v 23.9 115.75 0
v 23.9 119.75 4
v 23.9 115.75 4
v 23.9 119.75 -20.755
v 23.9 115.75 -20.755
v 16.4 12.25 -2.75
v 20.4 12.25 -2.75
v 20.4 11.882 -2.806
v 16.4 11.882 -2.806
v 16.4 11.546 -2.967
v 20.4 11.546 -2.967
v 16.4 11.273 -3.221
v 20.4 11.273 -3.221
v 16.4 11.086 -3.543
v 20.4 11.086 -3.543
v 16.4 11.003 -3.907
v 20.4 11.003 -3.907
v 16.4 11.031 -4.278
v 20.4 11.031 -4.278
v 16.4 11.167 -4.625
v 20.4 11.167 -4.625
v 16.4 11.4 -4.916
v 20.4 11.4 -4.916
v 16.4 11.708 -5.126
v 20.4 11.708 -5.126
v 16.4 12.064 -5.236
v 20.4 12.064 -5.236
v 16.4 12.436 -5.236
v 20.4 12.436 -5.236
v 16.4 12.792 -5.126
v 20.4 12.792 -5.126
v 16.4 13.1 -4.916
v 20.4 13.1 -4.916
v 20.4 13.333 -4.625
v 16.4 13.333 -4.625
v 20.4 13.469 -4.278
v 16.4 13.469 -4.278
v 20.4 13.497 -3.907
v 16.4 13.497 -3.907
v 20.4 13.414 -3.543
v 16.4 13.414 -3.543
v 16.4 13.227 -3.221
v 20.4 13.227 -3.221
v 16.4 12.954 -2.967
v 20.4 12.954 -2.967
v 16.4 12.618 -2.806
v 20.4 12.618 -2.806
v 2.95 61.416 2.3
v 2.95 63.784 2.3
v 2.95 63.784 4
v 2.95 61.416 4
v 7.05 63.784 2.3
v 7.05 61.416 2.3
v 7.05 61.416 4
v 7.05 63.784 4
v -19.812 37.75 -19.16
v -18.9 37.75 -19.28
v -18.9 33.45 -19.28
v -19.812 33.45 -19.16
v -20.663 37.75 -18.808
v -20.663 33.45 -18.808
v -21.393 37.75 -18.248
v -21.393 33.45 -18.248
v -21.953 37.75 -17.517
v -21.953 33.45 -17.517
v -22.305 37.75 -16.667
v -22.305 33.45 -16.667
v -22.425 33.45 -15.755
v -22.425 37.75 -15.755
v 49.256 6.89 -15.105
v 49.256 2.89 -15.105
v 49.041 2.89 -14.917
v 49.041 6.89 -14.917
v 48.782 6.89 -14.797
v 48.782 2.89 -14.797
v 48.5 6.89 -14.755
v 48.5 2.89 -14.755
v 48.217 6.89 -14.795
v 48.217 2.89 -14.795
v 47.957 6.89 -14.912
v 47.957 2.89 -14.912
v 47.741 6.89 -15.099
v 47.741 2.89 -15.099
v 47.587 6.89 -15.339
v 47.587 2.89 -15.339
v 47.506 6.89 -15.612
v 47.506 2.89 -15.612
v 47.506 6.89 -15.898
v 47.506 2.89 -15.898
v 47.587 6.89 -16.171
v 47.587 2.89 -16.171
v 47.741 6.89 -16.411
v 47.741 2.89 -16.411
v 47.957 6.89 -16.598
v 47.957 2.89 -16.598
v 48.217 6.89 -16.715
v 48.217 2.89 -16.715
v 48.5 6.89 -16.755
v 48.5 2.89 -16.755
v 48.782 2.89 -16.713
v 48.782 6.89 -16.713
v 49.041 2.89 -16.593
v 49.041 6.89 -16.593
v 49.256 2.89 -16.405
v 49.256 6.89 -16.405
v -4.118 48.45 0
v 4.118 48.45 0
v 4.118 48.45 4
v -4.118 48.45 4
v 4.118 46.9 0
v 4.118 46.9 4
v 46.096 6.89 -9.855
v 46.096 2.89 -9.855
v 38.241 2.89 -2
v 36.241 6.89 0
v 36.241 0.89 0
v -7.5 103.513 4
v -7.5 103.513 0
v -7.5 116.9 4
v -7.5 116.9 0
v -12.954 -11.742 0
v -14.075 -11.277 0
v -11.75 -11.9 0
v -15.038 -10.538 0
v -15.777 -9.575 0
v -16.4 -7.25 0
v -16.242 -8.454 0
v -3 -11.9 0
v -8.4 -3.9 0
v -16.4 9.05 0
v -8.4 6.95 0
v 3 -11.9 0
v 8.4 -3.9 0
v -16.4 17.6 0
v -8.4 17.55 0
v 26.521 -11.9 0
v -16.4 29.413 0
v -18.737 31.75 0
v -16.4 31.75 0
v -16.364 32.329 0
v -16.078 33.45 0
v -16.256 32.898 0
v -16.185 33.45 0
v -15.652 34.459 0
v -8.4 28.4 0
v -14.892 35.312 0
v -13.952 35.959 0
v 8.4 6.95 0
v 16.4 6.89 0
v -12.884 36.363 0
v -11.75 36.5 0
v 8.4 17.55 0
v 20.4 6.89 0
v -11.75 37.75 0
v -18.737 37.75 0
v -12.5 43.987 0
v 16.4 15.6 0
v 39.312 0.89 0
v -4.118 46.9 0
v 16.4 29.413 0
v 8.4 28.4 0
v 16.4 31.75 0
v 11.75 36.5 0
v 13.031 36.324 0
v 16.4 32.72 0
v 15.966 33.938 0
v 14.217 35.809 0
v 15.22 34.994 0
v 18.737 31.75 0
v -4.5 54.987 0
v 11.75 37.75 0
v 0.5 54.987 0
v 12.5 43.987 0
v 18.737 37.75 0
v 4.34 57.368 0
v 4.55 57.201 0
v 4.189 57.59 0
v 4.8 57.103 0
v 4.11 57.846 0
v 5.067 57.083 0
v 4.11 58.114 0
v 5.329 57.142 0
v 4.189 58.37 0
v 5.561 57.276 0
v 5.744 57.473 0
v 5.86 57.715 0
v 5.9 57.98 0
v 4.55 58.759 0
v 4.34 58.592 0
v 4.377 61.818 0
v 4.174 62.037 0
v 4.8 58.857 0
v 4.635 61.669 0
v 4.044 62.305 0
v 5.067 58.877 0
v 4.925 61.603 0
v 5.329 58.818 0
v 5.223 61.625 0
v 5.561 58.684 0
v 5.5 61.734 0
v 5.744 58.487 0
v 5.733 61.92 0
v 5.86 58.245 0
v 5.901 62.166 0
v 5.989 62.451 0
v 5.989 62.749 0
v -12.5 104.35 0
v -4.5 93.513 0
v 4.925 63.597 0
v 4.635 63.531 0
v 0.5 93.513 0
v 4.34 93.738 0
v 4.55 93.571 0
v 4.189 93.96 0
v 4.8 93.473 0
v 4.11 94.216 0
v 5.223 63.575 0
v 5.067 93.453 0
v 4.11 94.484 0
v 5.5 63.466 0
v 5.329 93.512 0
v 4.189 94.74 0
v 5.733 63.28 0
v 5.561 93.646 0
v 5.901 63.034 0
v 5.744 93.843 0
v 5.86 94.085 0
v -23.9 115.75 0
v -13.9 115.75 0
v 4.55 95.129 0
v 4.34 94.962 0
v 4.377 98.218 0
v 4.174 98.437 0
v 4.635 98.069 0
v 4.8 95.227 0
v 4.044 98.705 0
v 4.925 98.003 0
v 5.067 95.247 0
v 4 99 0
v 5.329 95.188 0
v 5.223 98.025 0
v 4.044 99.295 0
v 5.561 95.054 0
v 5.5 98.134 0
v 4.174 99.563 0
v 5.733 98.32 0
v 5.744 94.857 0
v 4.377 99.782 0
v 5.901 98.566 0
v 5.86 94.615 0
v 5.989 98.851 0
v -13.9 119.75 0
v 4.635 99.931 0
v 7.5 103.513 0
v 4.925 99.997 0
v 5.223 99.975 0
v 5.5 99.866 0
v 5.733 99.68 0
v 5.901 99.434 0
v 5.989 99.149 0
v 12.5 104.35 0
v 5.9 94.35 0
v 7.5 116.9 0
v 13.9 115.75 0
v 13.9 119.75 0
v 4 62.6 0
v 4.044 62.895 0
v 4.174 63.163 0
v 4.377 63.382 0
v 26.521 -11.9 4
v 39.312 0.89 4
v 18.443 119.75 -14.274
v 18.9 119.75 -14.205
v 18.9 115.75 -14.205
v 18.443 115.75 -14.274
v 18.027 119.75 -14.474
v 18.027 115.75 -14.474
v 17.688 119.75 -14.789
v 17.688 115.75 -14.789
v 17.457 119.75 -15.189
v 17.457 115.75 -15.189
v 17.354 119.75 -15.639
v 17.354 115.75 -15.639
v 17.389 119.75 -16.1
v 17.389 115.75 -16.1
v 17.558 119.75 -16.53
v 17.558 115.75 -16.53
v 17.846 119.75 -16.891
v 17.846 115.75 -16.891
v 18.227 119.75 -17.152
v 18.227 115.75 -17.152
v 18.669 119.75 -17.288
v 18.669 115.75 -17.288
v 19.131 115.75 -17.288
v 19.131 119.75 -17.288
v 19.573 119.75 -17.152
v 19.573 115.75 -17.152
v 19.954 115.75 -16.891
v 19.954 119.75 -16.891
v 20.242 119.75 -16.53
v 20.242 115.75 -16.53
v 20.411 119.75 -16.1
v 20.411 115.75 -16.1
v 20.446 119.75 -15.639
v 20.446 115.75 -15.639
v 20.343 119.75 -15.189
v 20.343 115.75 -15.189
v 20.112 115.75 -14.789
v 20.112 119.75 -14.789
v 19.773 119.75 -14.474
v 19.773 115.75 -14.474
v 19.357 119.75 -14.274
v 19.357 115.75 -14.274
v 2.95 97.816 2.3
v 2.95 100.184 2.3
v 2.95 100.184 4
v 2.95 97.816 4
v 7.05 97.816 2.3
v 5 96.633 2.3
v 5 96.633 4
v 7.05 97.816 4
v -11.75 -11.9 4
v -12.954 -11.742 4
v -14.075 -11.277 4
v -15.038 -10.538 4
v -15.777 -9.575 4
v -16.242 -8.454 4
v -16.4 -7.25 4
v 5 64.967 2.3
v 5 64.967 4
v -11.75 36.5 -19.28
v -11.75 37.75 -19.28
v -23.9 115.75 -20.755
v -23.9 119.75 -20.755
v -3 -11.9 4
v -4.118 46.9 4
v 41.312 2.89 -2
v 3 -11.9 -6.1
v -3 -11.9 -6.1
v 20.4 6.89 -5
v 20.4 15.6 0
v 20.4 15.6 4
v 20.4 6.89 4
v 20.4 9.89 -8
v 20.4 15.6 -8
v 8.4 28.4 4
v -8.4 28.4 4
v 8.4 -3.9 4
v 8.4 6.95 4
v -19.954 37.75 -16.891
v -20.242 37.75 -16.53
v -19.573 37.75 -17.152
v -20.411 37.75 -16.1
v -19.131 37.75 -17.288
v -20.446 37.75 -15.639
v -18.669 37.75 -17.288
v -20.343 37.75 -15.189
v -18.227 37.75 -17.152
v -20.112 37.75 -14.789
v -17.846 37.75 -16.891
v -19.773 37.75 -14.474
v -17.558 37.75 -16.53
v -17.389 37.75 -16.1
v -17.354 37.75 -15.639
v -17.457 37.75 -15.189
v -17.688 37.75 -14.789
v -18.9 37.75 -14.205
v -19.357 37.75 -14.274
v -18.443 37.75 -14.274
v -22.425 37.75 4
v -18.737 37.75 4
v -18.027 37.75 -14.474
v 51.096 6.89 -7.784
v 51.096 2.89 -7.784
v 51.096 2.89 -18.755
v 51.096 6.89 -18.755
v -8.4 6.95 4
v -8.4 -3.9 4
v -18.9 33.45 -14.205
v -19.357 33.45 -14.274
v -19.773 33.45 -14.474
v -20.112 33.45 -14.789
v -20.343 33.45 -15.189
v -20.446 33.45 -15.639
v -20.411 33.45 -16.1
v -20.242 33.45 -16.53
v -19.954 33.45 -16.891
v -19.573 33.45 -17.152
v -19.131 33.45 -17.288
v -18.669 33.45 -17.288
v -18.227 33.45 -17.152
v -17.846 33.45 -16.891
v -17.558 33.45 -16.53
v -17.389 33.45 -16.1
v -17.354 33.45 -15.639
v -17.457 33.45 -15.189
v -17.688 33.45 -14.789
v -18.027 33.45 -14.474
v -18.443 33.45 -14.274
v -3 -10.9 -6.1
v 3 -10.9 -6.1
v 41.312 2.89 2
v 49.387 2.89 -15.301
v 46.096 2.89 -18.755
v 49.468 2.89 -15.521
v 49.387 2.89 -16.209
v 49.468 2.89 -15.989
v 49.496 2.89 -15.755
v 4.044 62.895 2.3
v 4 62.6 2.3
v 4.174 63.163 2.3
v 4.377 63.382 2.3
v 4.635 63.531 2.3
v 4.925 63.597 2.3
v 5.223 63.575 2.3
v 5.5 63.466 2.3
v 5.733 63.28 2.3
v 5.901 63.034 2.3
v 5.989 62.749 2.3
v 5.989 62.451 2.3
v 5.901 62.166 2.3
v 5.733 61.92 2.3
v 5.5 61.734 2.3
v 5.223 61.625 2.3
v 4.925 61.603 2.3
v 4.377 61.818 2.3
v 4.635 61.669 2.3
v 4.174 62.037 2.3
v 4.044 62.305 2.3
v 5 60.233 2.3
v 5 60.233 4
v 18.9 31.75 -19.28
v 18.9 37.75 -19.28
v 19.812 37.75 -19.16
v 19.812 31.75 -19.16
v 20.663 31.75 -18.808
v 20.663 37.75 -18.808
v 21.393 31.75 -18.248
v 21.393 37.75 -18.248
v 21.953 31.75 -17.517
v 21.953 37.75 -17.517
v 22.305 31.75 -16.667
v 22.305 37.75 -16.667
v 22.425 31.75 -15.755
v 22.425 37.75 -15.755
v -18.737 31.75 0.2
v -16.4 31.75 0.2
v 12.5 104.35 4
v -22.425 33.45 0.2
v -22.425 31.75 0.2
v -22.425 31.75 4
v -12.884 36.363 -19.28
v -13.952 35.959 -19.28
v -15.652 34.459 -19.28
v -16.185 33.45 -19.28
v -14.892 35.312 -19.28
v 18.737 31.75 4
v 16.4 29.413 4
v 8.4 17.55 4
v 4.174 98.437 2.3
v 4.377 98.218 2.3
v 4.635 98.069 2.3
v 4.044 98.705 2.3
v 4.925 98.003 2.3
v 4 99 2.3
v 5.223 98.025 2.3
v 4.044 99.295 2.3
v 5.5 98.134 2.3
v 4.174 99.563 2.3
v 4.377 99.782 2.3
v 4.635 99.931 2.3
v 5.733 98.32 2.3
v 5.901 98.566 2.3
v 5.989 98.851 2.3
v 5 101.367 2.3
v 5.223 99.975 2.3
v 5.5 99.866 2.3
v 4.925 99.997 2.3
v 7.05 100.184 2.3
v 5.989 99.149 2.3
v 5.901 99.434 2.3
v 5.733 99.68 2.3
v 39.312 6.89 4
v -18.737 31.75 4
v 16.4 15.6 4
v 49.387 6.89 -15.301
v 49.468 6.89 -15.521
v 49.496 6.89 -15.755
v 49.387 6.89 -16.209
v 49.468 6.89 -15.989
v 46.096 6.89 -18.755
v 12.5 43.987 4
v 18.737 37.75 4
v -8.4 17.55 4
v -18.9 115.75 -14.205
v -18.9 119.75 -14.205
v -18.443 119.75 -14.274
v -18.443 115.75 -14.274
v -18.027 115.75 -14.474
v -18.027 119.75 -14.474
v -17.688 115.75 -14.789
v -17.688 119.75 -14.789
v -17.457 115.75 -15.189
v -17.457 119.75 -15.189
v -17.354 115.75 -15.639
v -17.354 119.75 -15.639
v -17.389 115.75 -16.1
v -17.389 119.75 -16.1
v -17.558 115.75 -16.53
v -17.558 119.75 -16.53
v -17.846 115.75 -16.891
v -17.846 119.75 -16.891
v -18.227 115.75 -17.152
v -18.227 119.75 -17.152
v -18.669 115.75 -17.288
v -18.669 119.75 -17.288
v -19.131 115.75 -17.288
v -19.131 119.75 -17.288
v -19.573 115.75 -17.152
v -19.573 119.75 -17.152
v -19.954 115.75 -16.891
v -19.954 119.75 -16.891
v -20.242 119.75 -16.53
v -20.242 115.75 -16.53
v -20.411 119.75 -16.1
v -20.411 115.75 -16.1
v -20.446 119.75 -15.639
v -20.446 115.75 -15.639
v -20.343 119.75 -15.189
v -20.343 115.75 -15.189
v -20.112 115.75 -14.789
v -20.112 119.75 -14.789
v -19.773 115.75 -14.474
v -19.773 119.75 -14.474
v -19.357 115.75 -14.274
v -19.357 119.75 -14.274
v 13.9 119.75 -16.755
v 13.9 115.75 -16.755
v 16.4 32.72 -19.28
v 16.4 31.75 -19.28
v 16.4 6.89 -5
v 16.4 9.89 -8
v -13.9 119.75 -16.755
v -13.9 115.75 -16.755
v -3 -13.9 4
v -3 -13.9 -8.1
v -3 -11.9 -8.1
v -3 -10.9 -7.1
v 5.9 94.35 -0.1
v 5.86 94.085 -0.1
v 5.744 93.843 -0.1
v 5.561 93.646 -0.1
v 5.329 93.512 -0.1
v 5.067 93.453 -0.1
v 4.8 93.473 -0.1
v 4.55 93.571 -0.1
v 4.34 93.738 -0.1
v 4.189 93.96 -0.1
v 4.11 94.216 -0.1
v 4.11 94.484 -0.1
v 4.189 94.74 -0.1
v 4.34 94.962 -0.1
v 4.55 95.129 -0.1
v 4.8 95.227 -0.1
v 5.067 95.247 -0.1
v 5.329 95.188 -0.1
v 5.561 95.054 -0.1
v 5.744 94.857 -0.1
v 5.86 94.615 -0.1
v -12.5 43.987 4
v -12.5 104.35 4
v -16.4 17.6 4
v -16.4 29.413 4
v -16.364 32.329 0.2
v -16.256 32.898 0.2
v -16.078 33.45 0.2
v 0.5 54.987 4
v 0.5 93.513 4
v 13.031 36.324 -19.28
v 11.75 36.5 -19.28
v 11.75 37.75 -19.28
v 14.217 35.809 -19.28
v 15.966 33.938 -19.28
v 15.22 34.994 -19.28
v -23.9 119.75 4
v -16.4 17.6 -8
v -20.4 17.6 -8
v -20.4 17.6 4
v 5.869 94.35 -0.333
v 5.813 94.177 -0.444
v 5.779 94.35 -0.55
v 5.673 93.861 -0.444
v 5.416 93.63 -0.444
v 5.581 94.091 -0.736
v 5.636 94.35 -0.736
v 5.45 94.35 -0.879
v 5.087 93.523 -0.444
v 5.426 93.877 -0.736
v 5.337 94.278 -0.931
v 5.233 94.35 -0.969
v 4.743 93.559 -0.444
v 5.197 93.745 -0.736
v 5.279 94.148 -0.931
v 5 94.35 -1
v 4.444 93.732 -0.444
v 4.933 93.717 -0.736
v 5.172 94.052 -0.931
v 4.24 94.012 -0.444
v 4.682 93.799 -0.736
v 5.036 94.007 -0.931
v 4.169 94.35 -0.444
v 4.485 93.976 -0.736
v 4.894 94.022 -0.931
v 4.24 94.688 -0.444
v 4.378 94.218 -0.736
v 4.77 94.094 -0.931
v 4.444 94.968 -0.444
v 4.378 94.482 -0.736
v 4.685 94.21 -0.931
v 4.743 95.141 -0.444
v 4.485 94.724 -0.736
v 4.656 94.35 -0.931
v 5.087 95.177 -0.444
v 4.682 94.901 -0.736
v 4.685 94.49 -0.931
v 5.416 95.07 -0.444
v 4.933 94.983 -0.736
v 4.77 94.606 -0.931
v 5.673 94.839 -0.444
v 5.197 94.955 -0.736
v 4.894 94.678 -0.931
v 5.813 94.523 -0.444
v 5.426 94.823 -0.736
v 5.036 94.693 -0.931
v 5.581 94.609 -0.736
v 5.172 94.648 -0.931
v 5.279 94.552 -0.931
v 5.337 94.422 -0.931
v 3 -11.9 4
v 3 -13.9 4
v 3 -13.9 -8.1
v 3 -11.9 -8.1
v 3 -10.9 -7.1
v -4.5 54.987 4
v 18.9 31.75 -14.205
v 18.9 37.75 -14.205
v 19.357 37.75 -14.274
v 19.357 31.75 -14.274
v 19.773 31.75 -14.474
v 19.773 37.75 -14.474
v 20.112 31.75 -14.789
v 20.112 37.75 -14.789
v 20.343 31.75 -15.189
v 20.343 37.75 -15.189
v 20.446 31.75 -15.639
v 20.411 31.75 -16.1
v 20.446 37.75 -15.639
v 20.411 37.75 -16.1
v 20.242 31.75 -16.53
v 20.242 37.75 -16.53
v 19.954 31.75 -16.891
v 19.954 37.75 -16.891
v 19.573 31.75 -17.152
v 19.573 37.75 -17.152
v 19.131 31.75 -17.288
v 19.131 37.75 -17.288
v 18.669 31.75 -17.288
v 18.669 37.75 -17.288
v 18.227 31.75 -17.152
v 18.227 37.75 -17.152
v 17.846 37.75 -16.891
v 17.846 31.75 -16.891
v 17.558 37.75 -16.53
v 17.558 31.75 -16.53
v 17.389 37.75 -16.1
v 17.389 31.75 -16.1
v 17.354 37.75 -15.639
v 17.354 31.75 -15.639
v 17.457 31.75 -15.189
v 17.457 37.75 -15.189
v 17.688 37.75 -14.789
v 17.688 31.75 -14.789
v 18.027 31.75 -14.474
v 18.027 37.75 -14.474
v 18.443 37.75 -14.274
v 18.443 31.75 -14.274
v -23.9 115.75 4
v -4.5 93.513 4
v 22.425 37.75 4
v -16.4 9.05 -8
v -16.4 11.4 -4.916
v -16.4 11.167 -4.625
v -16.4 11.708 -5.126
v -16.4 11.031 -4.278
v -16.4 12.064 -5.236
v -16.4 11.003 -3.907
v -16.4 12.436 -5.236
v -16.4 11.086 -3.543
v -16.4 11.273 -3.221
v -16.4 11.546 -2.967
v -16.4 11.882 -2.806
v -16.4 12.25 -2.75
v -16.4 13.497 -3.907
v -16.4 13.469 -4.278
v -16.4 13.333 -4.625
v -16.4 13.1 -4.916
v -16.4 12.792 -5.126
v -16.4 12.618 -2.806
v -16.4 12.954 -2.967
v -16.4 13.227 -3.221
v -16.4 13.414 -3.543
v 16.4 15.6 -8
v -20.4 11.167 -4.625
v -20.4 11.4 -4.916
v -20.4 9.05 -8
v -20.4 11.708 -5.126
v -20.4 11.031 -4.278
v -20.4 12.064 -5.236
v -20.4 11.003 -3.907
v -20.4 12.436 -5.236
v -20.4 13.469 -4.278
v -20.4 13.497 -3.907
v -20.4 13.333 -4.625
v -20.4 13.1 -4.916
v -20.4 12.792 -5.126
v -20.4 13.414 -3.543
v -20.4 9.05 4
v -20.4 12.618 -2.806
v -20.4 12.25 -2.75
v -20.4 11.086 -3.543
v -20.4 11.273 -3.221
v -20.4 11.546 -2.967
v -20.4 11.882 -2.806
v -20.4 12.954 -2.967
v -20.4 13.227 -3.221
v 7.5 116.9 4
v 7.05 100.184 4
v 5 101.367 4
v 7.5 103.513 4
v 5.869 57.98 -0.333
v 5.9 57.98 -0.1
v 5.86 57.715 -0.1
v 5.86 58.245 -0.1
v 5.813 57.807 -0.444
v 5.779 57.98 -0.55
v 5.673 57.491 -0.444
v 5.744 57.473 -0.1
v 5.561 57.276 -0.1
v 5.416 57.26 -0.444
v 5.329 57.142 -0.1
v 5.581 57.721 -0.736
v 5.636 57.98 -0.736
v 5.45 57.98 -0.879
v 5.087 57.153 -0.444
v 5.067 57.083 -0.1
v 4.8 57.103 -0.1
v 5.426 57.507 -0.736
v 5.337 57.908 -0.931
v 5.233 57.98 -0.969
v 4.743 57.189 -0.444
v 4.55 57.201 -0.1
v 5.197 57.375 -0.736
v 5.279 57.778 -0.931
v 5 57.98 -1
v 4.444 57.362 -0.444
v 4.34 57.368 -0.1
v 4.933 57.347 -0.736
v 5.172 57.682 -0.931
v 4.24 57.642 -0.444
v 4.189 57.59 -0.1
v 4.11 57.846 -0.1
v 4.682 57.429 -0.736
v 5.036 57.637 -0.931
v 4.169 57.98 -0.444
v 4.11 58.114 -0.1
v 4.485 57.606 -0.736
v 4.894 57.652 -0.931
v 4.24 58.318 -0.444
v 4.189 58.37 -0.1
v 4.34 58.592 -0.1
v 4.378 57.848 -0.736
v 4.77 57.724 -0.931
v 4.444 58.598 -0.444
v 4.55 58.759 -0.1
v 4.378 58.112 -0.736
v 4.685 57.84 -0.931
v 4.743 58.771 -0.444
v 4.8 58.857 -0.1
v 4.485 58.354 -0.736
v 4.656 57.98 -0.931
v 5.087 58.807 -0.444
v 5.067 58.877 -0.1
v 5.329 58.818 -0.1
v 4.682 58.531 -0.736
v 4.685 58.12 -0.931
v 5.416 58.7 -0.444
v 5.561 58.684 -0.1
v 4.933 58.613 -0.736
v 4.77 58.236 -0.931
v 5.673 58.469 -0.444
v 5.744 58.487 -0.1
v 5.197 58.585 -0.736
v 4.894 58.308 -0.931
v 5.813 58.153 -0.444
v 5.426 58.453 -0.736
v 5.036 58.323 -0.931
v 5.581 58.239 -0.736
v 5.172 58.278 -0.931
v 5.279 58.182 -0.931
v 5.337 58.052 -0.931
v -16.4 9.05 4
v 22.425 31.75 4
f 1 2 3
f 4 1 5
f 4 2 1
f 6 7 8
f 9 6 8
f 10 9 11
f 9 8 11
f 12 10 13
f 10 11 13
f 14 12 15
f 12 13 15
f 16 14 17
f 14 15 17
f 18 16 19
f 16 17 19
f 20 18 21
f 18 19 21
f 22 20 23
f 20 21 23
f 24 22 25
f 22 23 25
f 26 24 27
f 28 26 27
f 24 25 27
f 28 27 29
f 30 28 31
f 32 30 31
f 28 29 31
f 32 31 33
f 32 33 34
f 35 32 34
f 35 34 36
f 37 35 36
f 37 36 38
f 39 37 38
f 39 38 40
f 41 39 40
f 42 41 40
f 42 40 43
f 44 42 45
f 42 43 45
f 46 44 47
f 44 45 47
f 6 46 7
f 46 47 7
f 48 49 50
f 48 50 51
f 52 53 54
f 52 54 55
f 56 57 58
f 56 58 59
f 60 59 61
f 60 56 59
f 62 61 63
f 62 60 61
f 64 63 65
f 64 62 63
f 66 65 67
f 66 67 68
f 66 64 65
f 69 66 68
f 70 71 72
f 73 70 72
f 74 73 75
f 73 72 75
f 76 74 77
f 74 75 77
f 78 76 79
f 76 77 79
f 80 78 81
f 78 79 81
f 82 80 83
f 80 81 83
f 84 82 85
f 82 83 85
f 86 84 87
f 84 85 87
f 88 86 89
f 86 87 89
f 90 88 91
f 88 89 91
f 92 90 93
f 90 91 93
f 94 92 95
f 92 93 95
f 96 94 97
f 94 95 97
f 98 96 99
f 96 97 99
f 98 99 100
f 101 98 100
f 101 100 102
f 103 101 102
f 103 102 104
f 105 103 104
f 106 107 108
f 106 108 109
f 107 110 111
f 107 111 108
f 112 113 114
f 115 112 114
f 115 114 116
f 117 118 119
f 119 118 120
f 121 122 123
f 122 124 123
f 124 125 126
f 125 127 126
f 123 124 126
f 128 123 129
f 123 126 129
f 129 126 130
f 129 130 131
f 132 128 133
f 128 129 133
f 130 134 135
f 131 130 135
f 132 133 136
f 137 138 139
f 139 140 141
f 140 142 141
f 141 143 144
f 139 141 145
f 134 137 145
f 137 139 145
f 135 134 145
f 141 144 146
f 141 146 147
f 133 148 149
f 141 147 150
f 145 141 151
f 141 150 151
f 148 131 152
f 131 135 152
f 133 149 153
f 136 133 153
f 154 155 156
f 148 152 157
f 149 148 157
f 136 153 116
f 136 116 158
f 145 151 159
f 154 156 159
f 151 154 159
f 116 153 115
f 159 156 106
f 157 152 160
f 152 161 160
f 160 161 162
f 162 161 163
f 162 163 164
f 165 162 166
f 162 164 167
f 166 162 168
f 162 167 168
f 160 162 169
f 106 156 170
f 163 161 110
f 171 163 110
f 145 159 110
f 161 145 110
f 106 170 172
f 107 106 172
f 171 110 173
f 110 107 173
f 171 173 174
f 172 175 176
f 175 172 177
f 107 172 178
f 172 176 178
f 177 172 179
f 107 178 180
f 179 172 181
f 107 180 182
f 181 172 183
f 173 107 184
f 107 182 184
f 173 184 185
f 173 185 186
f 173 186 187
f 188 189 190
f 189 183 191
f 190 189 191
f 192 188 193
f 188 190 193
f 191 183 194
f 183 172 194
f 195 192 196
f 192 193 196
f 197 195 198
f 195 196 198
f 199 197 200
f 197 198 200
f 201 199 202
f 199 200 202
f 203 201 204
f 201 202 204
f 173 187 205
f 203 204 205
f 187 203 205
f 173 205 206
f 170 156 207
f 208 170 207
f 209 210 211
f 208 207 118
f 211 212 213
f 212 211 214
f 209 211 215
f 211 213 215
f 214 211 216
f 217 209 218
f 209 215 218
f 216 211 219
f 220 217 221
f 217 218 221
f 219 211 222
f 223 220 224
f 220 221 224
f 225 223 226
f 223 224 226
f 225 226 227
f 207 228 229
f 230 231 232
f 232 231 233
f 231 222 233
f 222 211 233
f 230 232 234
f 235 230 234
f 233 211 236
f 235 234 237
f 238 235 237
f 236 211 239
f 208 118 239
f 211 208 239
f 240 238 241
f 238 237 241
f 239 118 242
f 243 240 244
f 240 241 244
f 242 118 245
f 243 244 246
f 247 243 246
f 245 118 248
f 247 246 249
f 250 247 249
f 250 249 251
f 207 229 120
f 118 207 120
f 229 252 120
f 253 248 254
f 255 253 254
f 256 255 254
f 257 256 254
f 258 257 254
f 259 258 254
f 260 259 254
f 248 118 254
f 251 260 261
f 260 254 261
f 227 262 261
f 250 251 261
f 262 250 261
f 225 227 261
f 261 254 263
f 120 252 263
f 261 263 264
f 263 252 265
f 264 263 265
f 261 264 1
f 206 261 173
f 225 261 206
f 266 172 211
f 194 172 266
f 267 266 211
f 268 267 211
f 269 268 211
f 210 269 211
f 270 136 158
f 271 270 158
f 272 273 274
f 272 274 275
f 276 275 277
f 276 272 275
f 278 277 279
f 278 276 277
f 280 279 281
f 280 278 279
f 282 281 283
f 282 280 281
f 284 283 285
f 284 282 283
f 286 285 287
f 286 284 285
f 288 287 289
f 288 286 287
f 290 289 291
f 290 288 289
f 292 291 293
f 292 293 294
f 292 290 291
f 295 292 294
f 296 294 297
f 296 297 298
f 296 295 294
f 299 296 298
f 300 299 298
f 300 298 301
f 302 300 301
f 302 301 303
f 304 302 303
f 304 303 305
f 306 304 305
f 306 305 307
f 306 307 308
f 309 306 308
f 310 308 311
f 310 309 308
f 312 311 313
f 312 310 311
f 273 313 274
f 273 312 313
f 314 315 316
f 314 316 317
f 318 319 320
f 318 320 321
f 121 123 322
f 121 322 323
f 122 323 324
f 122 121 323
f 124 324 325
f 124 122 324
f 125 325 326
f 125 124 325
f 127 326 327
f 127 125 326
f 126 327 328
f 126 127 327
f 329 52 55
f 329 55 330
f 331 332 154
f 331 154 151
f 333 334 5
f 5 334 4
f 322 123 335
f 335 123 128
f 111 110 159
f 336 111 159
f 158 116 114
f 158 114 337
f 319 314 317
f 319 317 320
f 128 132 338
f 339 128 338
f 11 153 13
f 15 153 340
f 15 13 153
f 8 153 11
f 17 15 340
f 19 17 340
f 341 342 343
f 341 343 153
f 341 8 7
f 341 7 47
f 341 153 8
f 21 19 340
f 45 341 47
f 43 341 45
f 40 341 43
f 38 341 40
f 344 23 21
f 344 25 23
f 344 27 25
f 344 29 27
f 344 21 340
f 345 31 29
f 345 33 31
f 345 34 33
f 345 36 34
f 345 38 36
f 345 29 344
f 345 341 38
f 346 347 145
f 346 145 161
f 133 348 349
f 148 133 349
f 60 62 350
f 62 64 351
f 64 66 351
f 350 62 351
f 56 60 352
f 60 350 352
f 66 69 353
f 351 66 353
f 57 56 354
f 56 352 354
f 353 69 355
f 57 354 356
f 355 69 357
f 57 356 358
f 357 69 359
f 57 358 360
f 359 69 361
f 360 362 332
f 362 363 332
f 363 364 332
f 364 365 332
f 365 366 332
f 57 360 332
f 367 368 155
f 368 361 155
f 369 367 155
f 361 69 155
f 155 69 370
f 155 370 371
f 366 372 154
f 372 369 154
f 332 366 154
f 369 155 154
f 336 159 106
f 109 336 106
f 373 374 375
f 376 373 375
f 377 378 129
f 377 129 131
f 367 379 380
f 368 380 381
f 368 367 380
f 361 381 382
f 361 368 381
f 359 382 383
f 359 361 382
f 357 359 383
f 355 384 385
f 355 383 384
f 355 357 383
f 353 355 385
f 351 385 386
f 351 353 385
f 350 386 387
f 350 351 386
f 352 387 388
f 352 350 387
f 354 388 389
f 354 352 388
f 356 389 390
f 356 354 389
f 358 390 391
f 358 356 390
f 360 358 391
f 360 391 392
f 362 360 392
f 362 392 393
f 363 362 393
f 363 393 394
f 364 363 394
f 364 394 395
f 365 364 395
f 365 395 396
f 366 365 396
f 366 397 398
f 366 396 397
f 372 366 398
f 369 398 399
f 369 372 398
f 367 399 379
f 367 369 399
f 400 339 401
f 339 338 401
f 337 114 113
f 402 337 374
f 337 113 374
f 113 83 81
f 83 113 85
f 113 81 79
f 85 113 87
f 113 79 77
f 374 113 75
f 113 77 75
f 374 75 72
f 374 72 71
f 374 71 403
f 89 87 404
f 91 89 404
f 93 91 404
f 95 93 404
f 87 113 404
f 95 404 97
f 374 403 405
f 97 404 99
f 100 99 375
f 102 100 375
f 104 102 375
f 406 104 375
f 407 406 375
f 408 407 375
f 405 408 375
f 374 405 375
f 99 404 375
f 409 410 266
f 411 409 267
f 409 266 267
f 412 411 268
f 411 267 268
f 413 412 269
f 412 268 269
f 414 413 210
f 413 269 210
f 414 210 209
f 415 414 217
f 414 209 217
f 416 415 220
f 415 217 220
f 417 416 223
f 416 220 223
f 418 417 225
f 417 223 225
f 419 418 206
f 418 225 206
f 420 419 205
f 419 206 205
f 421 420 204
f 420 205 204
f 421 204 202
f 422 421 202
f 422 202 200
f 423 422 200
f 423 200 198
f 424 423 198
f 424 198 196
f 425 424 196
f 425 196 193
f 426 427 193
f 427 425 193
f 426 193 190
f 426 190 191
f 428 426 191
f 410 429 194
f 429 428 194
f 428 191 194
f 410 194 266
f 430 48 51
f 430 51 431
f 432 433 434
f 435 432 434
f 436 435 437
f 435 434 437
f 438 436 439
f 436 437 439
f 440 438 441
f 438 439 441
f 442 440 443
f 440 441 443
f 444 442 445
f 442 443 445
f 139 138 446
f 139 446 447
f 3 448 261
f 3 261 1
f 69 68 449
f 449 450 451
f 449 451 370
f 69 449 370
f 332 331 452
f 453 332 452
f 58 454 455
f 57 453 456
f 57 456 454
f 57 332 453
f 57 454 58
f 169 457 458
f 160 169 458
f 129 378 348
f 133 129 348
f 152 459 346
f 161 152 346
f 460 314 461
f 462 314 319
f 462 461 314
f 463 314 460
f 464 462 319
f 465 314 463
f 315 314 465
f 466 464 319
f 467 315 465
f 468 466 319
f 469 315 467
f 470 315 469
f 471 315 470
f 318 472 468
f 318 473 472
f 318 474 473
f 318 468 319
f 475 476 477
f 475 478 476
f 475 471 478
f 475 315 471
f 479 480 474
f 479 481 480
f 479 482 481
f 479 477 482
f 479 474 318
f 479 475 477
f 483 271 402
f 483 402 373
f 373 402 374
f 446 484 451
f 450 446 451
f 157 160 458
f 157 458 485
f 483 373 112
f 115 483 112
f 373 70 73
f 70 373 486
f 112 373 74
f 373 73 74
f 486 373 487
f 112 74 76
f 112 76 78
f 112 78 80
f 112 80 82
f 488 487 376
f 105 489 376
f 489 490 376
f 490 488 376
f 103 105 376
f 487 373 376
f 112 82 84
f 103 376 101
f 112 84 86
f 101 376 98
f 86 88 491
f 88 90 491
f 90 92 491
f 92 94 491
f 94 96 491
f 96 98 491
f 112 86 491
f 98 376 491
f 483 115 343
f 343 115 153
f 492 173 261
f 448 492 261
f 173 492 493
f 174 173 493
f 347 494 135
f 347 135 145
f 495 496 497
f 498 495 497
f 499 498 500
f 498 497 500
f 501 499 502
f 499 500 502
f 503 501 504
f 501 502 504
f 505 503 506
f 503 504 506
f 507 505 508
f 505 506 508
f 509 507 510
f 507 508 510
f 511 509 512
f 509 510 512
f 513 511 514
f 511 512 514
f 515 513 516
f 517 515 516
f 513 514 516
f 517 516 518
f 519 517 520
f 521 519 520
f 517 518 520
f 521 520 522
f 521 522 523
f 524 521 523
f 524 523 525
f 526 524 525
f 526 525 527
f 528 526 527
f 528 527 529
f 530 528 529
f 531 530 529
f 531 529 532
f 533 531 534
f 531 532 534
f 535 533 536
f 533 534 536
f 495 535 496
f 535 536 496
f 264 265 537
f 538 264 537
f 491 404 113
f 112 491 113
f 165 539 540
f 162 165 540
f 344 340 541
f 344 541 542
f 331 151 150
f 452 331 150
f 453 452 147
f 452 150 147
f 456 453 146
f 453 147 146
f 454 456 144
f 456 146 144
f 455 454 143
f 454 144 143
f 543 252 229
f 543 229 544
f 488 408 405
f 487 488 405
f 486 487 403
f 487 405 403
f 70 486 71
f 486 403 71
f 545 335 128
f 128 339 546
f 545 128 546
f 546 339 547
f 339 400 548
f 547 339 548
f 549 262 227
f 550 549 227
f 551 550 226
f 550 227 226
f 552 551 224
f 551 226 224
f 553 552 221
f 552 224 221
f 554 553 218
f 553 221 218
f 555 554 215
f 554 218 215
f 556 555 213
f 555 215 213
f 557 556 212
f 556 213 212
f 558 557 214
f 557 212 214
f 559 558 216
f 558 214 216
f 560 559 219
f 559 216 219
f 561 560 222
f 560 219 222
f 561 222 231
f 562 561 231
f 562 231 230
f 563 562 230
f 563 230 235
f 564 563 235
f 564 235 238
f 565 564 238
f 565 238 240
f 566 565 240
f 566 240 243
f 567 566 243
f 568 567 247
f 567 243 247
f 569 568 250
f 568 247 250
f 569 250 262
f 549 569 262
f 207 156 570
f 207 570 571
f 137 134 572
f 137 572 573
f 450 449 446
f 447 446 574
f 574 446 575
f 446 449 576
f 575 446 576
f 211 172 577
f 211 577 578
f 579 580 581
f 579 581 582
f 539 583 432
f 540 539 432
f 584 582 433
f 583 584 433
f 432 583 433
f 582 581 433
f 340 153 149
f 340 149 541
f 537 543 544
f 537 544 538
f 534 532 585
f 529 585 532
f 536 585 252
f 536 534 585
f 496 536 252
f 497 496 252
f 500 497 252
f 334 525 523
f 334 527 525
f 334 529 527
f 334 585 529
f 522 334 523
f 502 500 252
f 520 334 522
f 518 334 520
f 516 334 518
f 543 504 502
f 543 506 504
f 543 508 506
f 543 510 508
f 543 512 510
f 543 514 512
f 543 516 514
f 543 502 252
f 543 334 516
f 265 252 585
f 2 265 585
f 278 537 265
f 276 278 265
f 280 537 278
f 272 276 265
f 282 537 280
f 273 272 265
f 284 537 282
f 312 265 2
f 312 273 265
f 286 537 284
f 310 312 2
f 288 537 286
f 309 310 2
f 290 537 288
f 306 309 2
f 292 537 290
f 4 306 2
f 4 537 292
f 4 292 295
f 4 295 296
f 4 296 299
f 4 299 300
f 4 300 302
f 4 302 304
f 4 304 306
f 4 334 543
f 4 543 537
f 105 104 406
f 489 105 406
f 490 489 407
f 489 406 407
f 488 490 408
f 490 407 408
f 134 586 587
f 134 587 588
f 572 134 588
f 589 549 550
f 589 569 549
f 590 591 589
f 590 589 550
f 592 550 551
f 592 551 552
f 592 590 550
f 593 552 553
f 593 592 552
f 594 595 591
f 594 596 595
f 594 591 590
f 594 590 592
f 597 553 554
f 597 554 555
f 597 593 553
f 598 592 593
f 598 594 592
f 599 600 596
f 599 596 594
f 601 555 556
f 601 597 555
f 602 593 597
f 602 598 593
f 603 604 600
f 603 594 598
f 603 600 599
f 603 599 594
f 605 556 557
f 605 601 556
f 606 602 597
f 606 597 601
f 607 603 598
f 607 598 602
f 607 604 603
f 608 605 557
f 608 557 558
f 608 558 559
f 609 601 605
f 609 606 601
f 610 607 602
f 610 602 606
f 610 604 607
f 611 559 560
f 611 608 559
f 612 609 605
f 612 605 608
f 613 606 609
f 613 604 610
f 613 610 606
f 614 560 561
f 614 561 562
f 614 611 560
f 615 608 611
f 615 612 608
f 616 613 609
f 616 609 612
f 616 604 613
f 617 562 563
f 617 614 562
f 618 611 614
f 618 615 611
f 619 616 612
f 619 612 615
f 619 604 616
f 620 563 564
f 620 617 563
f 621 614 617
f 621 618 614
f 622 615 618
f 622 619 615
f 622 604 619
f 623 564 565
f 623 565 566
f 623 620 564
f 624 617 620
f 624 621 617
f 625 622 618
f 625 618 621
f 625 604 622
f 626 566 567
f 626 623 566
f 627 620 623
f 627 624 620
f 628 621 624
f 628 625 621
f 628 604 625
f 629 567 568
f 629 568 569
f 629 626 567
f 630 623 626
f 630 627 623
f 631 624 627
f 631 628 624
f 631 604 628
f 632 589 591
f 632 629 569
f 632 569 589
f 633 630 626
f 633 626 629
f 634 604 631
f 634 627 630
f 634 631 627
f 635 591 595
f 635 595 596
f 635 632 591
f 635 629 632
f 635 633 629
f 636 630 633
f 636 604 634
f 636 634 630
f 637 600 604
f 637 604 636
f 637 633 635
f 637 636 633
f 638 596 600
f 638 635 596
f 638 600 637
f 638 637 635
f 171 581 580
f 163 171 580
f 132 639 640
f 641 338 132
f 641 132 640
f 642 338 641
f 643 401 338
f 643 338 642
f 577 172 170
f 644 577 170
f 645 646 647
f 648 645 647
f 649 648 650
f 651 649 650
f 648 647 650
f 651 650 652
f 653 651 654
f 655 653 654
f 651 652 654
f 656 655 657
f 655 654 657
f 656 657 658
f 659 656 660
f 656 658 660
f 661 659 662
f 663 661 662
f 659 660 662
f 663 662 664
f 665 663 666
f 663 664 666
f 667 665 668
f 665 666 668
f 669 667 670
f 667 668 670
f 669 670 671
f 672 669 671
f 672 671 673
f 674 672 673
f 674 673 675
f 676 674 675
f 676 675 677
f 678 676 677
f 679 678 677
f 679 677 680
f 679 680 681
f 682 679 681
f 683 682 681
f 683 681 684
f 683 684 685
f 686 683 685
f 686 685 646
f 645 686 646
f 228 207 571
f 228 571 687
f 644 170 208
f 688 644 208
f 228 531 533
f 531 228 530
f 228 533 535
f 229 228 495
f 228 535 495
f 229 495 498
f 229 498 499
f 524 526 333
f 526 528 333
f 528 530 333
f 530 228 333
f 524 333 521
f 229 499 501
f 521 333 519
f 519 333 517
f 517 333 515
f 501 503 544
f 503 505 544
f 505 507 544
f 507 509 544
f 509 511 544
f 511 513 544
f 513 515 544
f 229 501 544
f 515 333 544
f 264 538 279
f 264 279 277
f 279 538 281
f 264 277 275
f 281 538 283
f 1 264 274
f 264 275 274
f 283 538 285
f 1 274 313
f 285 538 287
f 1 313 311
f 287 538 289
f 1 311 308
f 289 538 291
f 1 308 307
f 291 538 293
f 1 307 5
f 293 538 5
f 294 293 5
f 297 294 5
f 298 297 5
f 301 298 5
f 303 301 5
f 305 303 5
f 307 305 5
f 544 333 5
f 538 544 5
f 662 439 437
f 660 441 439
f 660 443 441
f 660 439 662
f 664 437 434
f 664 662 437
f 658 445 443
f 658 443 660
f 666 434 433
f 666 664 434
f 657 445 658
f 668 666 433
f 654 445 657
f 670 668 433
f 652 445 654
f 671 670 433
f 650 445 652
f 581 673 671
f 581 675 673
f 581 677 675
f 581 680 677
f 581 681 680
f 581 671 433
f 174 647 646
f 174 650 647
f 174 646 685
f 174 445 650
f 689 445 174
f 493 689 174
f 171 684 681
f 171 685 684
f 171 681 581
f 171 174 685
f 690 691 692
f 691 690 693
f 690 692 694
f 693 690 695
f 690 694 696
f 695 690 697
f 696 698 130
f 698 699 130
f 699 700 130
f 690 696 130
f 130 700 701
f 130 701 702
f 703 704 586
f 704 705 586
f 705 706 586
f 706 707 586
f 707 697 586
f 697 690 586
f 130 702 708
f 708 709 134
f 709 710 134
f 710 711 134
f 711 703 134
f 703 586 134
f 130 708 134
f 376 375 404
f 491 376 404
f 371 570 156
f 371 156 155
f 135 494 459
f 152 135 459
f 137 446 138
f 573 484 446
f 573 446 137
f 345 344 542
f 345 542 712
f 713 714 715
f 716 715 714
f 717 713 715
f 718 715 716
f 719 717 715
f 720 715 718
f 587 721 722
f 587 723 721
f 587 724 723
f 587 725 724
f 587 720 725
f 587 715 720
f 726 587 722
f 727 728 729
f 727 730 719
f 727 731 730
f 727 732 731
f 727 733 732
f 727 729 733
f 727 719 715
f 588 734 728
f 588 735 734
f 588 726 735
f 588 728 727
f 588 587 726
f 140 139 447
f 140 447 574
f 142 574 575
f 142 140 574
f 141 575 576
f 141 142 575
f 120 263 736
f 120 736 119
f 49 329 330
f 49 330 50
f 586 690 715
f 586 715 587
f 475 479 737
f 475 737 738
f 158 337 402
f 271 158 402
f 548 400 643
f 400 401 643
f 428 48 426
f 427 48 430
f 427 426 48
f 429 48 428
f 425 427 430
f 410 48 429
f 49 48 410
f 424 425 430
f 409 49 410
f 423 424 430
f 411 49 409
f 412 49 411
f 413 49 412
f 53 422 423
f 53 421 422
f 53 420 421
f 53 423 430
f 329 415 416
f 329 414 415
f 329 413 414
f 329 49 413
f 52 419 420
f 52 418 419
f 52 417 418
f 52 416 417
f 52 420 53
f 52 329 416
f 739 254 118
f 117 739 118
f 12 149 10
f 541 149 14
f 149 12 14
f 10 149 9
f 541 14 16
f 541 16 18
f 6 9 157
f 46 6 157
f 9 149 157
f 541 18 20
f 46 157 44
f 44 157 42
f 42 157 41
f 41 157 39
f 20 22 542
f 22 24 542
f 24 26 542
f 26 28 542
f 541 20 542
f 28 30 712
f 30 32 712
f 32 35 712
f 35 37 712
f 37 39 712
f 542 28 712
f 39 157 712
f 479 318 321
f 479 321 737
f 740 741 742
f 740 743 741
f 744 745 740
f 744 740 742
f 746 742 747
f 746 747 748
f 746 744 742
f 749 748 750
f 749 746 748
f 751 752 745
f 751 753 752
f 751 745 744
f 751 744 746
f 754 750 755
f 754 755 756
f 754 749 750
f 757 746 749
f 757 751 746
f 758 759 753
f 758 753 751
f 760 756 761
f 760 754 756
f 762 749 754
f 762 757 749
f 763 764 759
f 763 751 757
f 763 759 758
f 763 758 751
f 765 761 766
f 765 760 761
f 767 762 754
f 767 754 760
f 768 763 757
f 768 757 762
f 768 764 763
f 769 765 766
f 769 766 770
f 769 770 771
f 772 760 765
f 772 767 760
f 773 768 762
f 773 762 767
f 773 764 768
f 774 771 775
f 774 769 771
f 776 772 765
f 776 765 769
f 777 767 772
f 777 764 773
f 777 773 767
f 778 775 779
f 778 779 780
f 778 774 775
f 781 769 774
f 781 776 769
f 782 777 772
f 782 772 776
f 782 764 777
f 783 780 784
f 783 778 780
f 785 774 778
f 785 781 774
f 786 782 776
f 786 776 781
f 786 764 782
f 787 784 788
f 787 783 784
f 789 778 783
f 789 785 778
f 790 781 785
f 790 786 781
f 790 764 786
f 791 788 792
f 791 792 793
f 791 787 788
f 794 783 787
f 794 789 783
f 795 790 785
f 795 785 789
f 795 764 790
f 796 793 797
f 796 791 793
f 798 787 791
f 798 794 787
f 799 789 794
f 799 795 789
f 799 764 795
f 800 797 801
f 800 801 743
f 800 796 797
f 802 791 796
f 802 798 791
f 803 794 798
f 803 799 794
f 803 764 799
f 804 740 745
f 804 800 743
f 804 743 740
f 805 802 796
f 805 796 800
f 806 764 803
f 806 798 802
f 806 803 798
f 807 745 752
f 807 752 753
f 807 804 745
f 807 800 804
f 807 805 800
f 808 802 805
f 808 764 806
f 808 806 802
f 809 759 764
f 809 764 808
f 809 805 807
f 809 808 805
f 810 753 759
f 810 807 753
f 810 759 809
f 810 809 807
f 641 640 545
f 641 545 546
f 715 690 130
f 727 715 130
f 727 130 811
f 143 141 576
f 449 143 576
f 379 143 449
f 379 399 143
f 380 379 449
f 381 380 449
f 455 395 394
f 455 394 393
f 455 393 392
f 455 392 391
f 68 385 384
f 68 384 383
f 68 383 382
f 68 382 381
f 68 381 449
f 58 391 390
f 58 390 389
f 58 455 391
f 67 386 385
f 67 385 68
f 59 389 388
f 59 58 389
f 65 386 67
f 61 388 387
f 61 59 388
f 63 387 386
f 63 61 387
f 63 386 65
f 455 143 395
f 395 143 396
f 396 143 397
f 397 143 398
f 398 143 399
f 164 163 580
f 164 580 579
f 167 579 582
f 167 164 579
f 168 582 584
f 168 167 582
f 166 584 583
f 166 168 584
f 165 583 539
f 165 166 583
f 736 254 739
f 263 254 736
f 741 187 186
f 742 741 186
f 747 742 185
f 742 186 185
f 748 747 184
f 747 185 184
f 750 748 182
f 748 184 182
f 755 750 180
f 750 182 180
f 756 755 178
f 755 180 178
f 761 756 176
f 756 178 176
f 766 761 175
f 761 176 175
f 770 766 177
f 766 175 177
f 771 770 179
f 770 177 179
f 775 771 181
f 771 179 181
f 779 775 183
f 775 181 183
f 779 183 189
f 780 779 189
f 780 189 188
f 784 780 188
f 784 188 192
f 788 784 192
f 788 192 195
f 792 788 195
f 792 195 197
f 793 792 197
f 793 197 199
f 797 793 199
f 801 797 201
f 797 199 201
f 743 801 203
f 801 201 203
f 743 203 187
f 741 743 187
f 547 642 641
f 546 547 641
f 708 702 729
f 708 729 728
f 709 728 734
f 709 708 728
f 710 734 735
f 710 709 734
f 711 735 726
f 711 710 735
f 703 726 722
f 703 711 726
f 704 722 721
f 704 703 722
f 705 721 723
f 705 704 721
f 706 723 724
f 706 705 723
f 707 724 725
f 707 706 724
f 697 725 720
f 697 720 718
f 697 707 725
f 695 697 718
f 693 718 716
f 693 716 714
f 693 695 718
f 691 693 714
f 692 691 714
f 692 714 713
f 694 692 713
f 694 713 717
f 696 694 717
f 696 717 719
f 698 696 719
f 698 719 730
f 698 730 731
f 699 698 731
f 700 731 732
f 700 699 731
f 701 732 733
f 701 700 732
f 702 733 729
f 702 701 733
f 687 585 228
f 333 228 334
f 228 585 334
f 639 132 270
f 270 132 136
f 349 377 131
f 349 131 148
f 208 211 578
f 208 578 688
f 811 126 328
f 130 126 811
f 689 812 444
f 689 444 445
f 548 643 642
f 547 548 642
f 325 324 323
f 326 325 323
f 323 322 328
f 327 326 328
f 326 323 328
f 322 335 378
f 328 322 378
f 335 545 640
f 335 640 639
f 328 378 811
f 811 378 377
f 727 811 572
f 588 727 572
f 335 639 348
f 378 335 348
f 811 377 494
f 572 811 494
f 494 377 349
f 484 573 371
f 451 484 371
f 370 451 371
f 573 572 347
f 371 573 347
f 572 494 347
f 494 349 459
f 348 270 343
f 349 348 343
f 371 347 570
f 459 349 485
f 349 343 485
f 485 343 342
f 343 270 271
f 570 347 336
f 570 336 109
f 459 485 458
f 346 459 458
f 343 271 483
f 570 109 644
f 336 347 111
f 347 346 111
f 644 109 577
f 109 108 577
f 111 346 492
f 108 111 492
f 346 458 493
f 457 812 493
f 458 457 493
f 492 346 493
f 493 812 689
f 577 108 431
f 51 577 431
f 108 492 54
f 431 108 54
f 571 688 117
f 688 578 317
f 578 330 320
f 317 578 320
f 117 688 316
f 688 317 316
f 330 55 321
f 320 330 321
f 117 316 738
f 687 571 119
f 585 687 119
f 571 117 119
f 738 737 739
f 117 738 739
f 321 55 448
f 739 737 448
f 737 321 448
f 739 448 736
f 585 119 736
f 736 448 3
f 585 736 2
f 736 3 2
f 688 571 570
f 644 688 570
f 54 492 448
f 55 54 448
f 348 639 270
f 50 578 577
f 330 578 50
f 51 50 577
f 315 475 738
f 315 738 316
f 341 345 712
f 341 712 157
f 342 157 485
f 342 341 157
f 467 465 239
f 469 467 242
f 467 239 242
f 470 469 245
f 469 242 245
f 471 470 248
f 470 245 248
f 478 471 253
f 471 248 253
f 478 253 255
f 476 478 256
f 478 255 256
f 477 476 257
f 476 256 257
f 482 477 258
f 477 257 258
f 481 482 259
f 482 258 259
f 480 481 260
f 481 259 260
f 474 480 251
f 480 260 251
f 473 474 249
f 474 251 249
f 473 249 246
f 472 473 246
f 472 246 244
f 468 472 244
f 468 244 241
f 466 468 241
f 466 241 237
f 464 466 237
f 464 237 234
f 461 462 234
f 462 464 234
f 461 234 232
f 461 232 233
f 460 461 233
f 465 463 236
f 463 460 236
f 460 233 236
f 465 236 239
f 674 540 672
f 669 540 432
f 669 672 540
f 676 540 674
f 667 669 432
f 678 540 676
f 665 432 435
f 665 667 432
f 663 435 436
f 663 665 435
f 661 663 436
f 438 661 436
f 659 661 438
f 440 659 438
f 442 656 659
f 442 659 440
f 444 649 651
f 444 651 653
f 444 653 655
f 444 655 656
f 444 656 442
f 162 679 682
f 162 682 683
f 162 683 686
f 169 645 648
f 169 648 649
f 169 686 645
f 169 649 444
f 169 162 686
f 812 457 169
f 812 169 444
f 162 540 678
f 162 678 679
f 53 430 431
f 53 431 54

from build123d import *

# Parameters (mm, degrees)
EXTRUDE_1_DEPTH     = 4
SKETCH_2_W          = 15
SKETCH_2_H          = 13.3866
CUT_EXTRUDE_1_DEPTH = 121.93395925
SKETCH_3_W          = 10
SKETCH_3_H          = 10
SKETCH_3_R          = 1.55
SKETCH_3_H_2        = 14.755
EXTRUDE_2_DEPTH     = 4
EXTRUDE_3_DEPTH     = 4
EXTRUDE_4_DEPTH     = 4
SKETCH_7_W          = 27.8
SKETCH_7_H          = 4
EXTRUDE_5_DEPTH     = 4
EXTRUDE_START       = -4
EXTRUDE_6_DEPTH     = 4
SKETCH_11_W         = 16.8
SKETCH_11_H         = 10.85
CUT_EXTRUDE_2_DEPTH = 133.52791749
CHAMFER_1_SIZE      = 2
CHAMFER_2_SIZE      = 2
SKETCH_12_W         = 12
SKETCH_12_H         = 8.55
SKETCH_12_R         = 1.25
EXTRUDE_7_DEPTH     = 4
EXTRUDE_START_2     = 4
SKETCH_13_R         = 1.25
SKETCH_13_W         = 4
SKETCH_13_H         = 8.709663749
EXTRUDE_8_DEPTH     = 4
SKETCH_14_R         = 1
CUT_EXTRUDE_3_DEPTH = 132.839329922
SKETCH_15_R         = 0.9
EXTRUDE_9_DEPTH     = 1
FILLET_1_R          = 0.9
CUT_EXTRUDE_START   = -1.7
SKETCH_16_R         = 1
CUT_EXTRUDE_4_DEPTH = 1.7
CUT_EXTRUDE_5_DEPTH = 132.839329922
SKETCH_19_W         = 5
SKETCH_19_H         = 38.5268
SKETCH_19_W_2       = 8.236887868
SKETCH_19_H_2       = 1.55
CUT_EXTRUDE_6_DEPTH = 132.839329922
EXTRUDE_12_DEPTH    = 23.28
CUT_EXTRUDE_7_REACH = 100.821
SKETCH_23_R         = 1.55
EXTRUDE_13_DEPTH    = 4
CUT_EXTRUDE_START_2 = -19.28
CUT_EXTRUDE_8_DEPTH = 19.48
SKETCH_26_W         = 10.1
SKETCH_26_H         = 2
EXTRUDE_14_DEPTH    = 3


# Read off the part's stored shape, not the designer's step: 切除-拉伸8
with BuildPart() as part:
    # 草图1 → 凸台-拉伸1 (new body)
    with BuildSketch(Plane.XY):
        with BuildLine():
            Line((-16.4, -7.25), (-16.4, 119.75))
            Line((-16.4, 119.75), (16.4, 119.75))
            Line((16.4, 119.75), (16.4, -7.25))
            ThreePointArc((16.4, -7.25), (15.038046533, -10.538046533), (11.75, -11.9))
            Line((11.75, -11.9), (-11.75, -11.9))
            ThreePointArc((-11.75, -11.9), (-15.038046533, -10.538046533), (-16.4, -7.25))
        make_face()
    extrude(amount=EXTRUDE_1_DEPTH)

    # 草图2 → 切除-拉伸1 (cut, through all)
    with BuildSketch(Plane(origin=(0, 0, 0), x_dir=(-1, 0, 0), z_dir=(0, 0, -1))):
        with Locations((0, 110.2067)):
            Rectangle(SKETCH_2_W, SKETCH_2_H)
    extrude(amount=-CUT_EXTRUDE_1_DEPTH, mode=Mode.SUBTRACT)

    # 草图3 → 凸台-拉伸2 (add)
    # profile 1 of 2: a face of its own
    with BuildSketch(Plane(origin=(0, 119.75, 0), x_dir=(1, 0, 0), z_dir=(0, 1, 0))):
        with Locations((-18.9, 15.755)):
            Rectangle(SKETCH_3_W, SKETCH_3_H)
        with Locations(Location((-18.9, 15.755, 0), (0, 0, 270))):
            Circle(SKETCH_3_R, mode=Mode.SUBTRACT)
    # profile 2 of 2: a face of its own
    with BuildSketch(Plane(origin=(0, 119.75, 0), x_dir=(1, 0, 0), z_dir=(0, 1, 0))):
        with Locations((-18.9, 3.3775)):
            Rectangle(SKETCH_3_W, SKETCH_3_H_2)
    extrude_2 = extrude(amount=-EXTRUDE_2_DEPTH)

    # 镜向1: 凸台-拉伸2 across plane
    add(extrude_2.mirror(Plane(origin=(0, 0, 0), x_dir=(0, 0, 1), z_dir=(1, 0, 0))))

    # 草图6 → 凸台-拉伸4 (add)
    with BuildSketch(Plane.XY.offset(4)):
        Polygon((-16.4, 115.75), (-23.9, 115.75), (-16.4, 108.25), align=None)
        Polygon((16.4, 115.75), (16.4, 108.25), (23.9, 115.75), align=None)
    extrude(amount=-EXTRUDE_4_DEPTH)

    # 草图7 → 凸台-拉伸5 (add)
    with BuildSketch(Plane(origin=(0, 119.75, 0), x_dir=(1, 0, 0), z_dir=(0, 1, 0))):
        with Locations((0, 18.755)):
            Rectangle(SKETCH_7_W, SKETCH_7_H)
    extrude(amount=-EXTRUDE_5_DEPTH)



with BuildPart() as body_2:
    # 草图5 → 凸台-拉伸3 (new body)
    with BuildSketch(Plane(origin=(0, 2.890336251, 0), x_dir=(1, 0, 0), z_dir=(0, 1, 0))):
        Polygon((50.795757056, 9.855), (46.095757056, 9.855), (32.240757056, -4), (39.311824868, -4), (51.095757056, 7.783932188), (51.095757056, 9.855), align=None)
        with BuildLine():
            Line((50.795757056, 18.755), (46.095757056, 18.755))
            Line((46.095757056, 18.755), (46.095757056, 9.855))
            Line((46.095757056, 9.855), (50.795757056, 9.855))
            Line((50.795757056, 9.855), (50.795757056, 15.105))
            Line((50.795757056, 15.105), (49.255691264, 15.105))
            ThreePointArc((49.255691264, 15.105), (47.495757056, 15.755), (49.255691264, 16.405))
            Line((49.255691264, 16.405), (50.795757056, 16.405))
            Line((50.795757056, 16.405), (50.795757056, 18.755))
        make_face()
        with BuildLine():
            Line((51.095757056, 18.755), (50.795757056, 18.755))
            Line((50.795757056, 18.755), (50.795757056, 16.405))
            Line((50.795757056, 16.405), (49.255691264, 16.405))
            ThreePointArc((49.255691264, 16.405), (49.433822674, 16.10145764), (49.495757056, 15.755))
            ThreePointArc((49.495757056, 15.755), (49.433822674, 15.40854236), (49.255691264, 15.105))
            Line((49.255691264, 15.105), (50.795757056, 15.105))
            Line((50.795757056, 15.105), (50.795757056, 9.855))
            Line((50.795757056, 9.855), (51.095757056, 9.855))
            Line((51.095757056, 9.855), (51.095757056, 18.755))
        make_face()
    extrude(amount=EXTRUDE_3_DEPTH)


with BuildPart() as part_1:
    add(part.part)

    add(body_2.part)  # 凸台-拉伸6 merges body 2
    # 草图8 → 凸台-拉伸6 (add)
    with BuildSketch(Plane.XY.offset(4).offset(EXTRUDE_START)):
        with BuildLine():
            Line((26.521488617, -11.9), (39.311824868, 0.890336251))
            Line((39.311824868, 0.890336251), (39.311824868, 6.890336251))
            Line((39.311824868, 6.890336251), (16.4, 6.890336251))
            Line((16.4, 6.890336251), (16.4, -7.25))
            ThreePointArc((16.4, -7.25), (15.038046533, -10.538046533), (11.75, -11.9))
            Line((11.75, -11.9), (26.521488617, -11.9))
        make_face()
    extrude(amount=EXTRUDE_6_DEPTH)

    # 草图11 → 切除-拉伸2 (cut, through all)
    with BuildSketch(Plane.XY.offset(4)):
        with Locations((0, 1.525)):
            Rectangle(SKETCH_11_W, SKETCH_11_H)
        with Locations((0, 22.975)):
            Rectangle(SKETCH_11_W, SKETCH_11_H)
    extrude(amount=-CUT_EXTRUDE_2_DEPTH, mode=Mode.SUBTRACT)

    # 倒角1
    chamfer_1_edges = [part_1.edges().sort_by_distance(p)[0] for p in [
        (39.311824868, 2.890336251, 2),
    ]]
    chamfer(chamfer_1_edges, length=CHAMFER_1_SIZE - 0.0001)  # a hair under: the kernel refuses the full size

    # 倒角2
    chamfer_2_edges = [part_1.edges().sort_by_distance(p)[0] for p in [
        (38.776240962, 2.890336251, 0),
    ]]
    chamfer(chamfer_2_edges, length=CHAMFER_2_SIZE - 0.0001)  # a hair under: the kernel refuses the full size

    # 草图12 → 凸台-拉伸7 (add)
    with BuildSketch(Plane.ZY.offset(16.4)):
        with Locations((-2, 13.325)):
            Rectangle(SKETCH_12_W, SKETCH_12_H)
        with Locations((-4, 12.25)):
            Circle(SKETCH_12_R, mode=Mode.SUBTRACT)
    extrude(amount=EXTRUDE_7_DEPTH)

    # 草图13 → 凸台-拉伸8 (add)
    # profile 1 of 2: a face of its own
    with BuildSketch(Plane(origin=(16.4, 0, 0), x_dir=(0, 0, -1), z_dir=(1, 0, 0)).offset(EXTRUDE_START_2)):
        Polygon((8, 9.890336251), (8, 15.6), (0, 15.6), (0, 6.890336251), (5, 6.890336251), align=None)
        with Locations(Location((4, 12.25, 0), (0, 0, 180))):
            Circle(SKETCH_13_R, mode=Mode.SUBTRACT)
    # profile 2 of 2: a face of its own
    with BuildSketch(Plane(origin=(16.4, 0, 0), x_dir=(0, 0, -1), z_dir=(1, 0, 0)).offset(EXTRUDE_START_2)):
        with Locations((-2, 11.245168126)):
            Rectangle(SKETCH_13_W, SKETCH_13_H)
    extrude(amount=-EXTRUDE_8_DEPTH)

    # 草图14 → 切除-拉伸3 (cut, through all)
    with BuildSketch(Plane(origin=(0, 0, 0), x_dir=(-1, 0, 0), z_dir=(0, 0, -1))):
        with Locations((-5, 62.6)):
            Circle(SKETCH_14_R)
        with Locations((-5, 99)):
            Circle(SKETCH_14_R)
    extrude(amount=-CUT_EXTRUDE_3_DEPTH, mode=Mode.SUBTRACT)

    # 草图15 → 凸台-拉伸9 (add)
    with BuildSketch(Plane(origin=(0, 0, 0), x_dir=(-1, 0, 0), z_dir=(0, 0, -1))):
        with Locations(Location((-5, 94.35, 0), (0, 0, 180))):
            Circle(SKETCH_15_R)
        with Locations(Location((-5, 57.98, 0), (0, 0, 180))):
            Circle(SKETCH_15_R)
    extrude(amount=EXTRUDE_9_DEPTH)

    # 圆角1
    fillet_1_edges = [part_1.edges().sort_by_distance(p)[0] for p in [
        (4.1, 94.35, -1),
        (4.1, 57.98, -1),
    ]]
    fillet(fillet_1_edges, radius=FILLET_1_R)

    # 草图16 → 切除-拉伸4 (cut)
    # profile 1 of 2: a face of its own
    with BuildSketch(Plane.XY.offset(4).offset(CUT_EXTRUDE_START)):
        Polygon((7.05, 61.416431948), (7.05, 63.783568052), (5, 64.967136104), (2.95, 63.783568052), (2.95, 61.416431948), (5, 60.232863896), align=None)
        with Locations(Location((5, 62.6, 0), (0, 0, 180))):
            Circle(SKETCH_16_R, mode=Mode.SUBTRACT)
    # profile 2 of 2: a face of its own
    with BuildSketch(Plane.XY.offset(4).offset(CUT_EXTRUDE_START)):
        Polygon((2.95, 97.816431948), (5, 96.632863896), (7.05, 97.816431948), (7.05, 100.183568052), (5, 101.367136104), (2.95, 100.183568052), align=None)
        with Locations(Location((5, 99, 0), (0, 0, 180))):
            Circle(SKETCH_16_R, mode=Mode.SUBTRACT)
    extrude(amount=CUT_EXTRUDE_4_DEPTH, mode=Mode.SUBTRACT)

    # 草图17 → 切除-拉伸5 (cut, symmetric)
    with BuildSketch(Plane(origin=(0, 0, 0), x_dir=(-1, 0, 0), z_dir=(0, 0, -1))):
        Polygon((-12.5, 104.35), (-16.4, 108.25), (-16.4, 40.0866), (-12.5, 43.9866), align=None)
    cut_extrude_5 = extrude(amount=CUT_EXTRUDE_5_DEPTH, both=True, mode=Mode.SUBTRACT)

    # 镜向2: 切除-拉伸5 across plane
    add(cut_extrude_5.mirror(Plane(origin=(0, 0, 0), x_dir=(0, 0, 1), z_dir=(1, 0, 0))), mode=Mode.SUBTRACT)

    # 草图19 → 切除-拉伸6 (cut, through all)
    with BuildSketch(Plane(origin=(0, 0, 0), x_dir=(-1, 0, 0), z_dir=(0, 0, -1))):
        with Locations((2, 74.25)):
            Rectangle(SKETCH_19_W, SKETCH_19_H)
        with Locations((0, 47.675)):
            Rectangle(SKETCH_19_W_2, SKETCH_19_H_2)
    extrude(amount=-CUT_EXTRUDE_6_DEPTH, mode=Mode.SUBTRACT)

    # 草图22 → 凸台-拉伸12 (add)
    with BuildSketch(Plane.XY.offset(4)):
        with BuildLine():
            Line((16.4, 32.719535971), (16.4, 31.75))
            Line((16.4, 31.75), (22.425, 31.75))
            Line((22.425, 31.75), (22.425, 37.75))
            Line((22.425, 37.75), (11.75, 37.75))
            Line((11.75, 37.75), (11.75, 36.5))
            ThreePointArc((11.75, 36.5), (14.746431556, 35.435633993), (16.4, 32.719535971))
        make_face()
    extrude_12 = extrude(amount=-EXTRUDE_12_DEPTH)

    # 草图23 → 切除-拉伸7 (cut, up to next)
    with BuildSketch(Plane(origin=(0, 37.75, 0), x_dir=(1, 0, 0), z_dir=(0, 1, 0)), mode=Mode.PRIVATE) as cut_extrude_7_sk1:
        with Locations(Location((18.9, 15.755, 0), (0, 0, 270))):
            Circle(SKETCH_23_R)
    cut_extrude_7_tool1 = extrude(cut_extrude_7_sk1.sketch, amount=-CUT_EXTRUDE_7_REACH, mode=Mode.PRIVATE) & part_1.part
    # 草图23 → 切除-拉伸7 (cut, up to next)
    with BuildSketch(Plane(origin=(0, 37.75, 0), x_dir=(1, 0, 0), z_dir=(0, 1, 0)), mode=Mode.PRIVATE) as cut_extrude_7_sk2:
        with BuildLine():
            ThreePointArc((18.9, 19.28), (21.392551404, 18.247551403), (22.425, 15.754999999))
            Line((22.425, 15.754999999), (22.425, 19.28))
            Line((22.425, 19.28), (18.9, 19.28))
        make_face()
    cut_extrude_7_tool2 = extrude(cut_extrude_7_sk2.sketch, amount=-CUT_EXTRUDE_7_REACH, mode=Mode.PRIVATE) & part_1.part
    cut_extrude_7_1 = cut_extrude_7_tool1.solids().sort_by_distance((18.9, 37.75, -15.755))[0]
    add(cut_extrude_7_1, mode=Mode.SUBTRACT)
    cut_extrude_7_2 = cut_extrude_7_tool2.solids().sort_by_distance((21.637628, 37.75, -18.492628))[0]
    add(cut_extrude_7_2, mode=Mode.SUBTRACT)
    cut_extrude_7 = cut_extrude_7_1 + cut_extrude_7_2  # 切除-拉伸7 as one shape, for the pattern or mirror that repeats it

    # 草图24 → 凸台-拉伸13 (add)
    with BuildSketch(Plane.XY.offset(4)):
        Polygon((16.4, 40.0866), (18.7366, 37.75), (18.7366, 31.75), (16.4, 29.4134), align=None)
    extrude_13 = extrude(amount=-EXTRUDE_13_DEPTH)

    # 镜向3: 凸台-拉伸12, 切除-拉伸7, 凸台-拉伸13 across plane
    add(extrude_12.mirror(Plane(origin=(0, 0, 0), x_dir=(0, 0, 1), z_dir=(1, 0, 0))))
    add(cut_extrude_7.mirror(Plane(origin=(0, 0, 0), x_dir=(0, 0, 1), z_dir=(1, 0, 0))), mode=Mode.SUBTRACT)
    add(extrude_13.mirror(Plane(origin=(0, 0, 0), x_dir=(0, 0, 1), z_dir=(1, 0, 0))))

    # 切除-拉伸8 outline → 切除-拉伸8 (cut)
    with BuildSketch(Plane.XY.offset(CUT_EXTRUDE_START_2)):
        with BuildLine():
            ThreePointArc((-16.4, 31.75), (-16.318817794, 32.615103442), (-16.078105821, 33.45))
            Line((-16.078105821, 33.45), (-22.425, 33.45))
            Line((-22.425, 33.45), (-22.425, 31.75))
            Line((-22.425, 31.75), (-16.4, 31.75))
        make_face()
    extrude(amount=CUT_EXTRUDE_8_DEPTH, mode=Mode.SUBTRACT)

    # 草图26 → 凸台-拉伸14 (add, symmetric)
    with BuildSketch(Plane(origin=(0, 0, 0), x_dir=(0, 0, -1), z_dir=(1, 0, 0))):
        with Locations((1.05, -12.9)):
            Rectangle(SKETCH_26_W, SKETCH_26_H)
        Polygon((8.1, -11.9), (8.1, -13.9), (6.1, -13.9), (6.1, -11.9), (6.1, -10.9), (7.1, -10.9), align=None)
    extrude(amount=EXTRUDE_14_DEPTH, both=True)


solid = part_1.part
